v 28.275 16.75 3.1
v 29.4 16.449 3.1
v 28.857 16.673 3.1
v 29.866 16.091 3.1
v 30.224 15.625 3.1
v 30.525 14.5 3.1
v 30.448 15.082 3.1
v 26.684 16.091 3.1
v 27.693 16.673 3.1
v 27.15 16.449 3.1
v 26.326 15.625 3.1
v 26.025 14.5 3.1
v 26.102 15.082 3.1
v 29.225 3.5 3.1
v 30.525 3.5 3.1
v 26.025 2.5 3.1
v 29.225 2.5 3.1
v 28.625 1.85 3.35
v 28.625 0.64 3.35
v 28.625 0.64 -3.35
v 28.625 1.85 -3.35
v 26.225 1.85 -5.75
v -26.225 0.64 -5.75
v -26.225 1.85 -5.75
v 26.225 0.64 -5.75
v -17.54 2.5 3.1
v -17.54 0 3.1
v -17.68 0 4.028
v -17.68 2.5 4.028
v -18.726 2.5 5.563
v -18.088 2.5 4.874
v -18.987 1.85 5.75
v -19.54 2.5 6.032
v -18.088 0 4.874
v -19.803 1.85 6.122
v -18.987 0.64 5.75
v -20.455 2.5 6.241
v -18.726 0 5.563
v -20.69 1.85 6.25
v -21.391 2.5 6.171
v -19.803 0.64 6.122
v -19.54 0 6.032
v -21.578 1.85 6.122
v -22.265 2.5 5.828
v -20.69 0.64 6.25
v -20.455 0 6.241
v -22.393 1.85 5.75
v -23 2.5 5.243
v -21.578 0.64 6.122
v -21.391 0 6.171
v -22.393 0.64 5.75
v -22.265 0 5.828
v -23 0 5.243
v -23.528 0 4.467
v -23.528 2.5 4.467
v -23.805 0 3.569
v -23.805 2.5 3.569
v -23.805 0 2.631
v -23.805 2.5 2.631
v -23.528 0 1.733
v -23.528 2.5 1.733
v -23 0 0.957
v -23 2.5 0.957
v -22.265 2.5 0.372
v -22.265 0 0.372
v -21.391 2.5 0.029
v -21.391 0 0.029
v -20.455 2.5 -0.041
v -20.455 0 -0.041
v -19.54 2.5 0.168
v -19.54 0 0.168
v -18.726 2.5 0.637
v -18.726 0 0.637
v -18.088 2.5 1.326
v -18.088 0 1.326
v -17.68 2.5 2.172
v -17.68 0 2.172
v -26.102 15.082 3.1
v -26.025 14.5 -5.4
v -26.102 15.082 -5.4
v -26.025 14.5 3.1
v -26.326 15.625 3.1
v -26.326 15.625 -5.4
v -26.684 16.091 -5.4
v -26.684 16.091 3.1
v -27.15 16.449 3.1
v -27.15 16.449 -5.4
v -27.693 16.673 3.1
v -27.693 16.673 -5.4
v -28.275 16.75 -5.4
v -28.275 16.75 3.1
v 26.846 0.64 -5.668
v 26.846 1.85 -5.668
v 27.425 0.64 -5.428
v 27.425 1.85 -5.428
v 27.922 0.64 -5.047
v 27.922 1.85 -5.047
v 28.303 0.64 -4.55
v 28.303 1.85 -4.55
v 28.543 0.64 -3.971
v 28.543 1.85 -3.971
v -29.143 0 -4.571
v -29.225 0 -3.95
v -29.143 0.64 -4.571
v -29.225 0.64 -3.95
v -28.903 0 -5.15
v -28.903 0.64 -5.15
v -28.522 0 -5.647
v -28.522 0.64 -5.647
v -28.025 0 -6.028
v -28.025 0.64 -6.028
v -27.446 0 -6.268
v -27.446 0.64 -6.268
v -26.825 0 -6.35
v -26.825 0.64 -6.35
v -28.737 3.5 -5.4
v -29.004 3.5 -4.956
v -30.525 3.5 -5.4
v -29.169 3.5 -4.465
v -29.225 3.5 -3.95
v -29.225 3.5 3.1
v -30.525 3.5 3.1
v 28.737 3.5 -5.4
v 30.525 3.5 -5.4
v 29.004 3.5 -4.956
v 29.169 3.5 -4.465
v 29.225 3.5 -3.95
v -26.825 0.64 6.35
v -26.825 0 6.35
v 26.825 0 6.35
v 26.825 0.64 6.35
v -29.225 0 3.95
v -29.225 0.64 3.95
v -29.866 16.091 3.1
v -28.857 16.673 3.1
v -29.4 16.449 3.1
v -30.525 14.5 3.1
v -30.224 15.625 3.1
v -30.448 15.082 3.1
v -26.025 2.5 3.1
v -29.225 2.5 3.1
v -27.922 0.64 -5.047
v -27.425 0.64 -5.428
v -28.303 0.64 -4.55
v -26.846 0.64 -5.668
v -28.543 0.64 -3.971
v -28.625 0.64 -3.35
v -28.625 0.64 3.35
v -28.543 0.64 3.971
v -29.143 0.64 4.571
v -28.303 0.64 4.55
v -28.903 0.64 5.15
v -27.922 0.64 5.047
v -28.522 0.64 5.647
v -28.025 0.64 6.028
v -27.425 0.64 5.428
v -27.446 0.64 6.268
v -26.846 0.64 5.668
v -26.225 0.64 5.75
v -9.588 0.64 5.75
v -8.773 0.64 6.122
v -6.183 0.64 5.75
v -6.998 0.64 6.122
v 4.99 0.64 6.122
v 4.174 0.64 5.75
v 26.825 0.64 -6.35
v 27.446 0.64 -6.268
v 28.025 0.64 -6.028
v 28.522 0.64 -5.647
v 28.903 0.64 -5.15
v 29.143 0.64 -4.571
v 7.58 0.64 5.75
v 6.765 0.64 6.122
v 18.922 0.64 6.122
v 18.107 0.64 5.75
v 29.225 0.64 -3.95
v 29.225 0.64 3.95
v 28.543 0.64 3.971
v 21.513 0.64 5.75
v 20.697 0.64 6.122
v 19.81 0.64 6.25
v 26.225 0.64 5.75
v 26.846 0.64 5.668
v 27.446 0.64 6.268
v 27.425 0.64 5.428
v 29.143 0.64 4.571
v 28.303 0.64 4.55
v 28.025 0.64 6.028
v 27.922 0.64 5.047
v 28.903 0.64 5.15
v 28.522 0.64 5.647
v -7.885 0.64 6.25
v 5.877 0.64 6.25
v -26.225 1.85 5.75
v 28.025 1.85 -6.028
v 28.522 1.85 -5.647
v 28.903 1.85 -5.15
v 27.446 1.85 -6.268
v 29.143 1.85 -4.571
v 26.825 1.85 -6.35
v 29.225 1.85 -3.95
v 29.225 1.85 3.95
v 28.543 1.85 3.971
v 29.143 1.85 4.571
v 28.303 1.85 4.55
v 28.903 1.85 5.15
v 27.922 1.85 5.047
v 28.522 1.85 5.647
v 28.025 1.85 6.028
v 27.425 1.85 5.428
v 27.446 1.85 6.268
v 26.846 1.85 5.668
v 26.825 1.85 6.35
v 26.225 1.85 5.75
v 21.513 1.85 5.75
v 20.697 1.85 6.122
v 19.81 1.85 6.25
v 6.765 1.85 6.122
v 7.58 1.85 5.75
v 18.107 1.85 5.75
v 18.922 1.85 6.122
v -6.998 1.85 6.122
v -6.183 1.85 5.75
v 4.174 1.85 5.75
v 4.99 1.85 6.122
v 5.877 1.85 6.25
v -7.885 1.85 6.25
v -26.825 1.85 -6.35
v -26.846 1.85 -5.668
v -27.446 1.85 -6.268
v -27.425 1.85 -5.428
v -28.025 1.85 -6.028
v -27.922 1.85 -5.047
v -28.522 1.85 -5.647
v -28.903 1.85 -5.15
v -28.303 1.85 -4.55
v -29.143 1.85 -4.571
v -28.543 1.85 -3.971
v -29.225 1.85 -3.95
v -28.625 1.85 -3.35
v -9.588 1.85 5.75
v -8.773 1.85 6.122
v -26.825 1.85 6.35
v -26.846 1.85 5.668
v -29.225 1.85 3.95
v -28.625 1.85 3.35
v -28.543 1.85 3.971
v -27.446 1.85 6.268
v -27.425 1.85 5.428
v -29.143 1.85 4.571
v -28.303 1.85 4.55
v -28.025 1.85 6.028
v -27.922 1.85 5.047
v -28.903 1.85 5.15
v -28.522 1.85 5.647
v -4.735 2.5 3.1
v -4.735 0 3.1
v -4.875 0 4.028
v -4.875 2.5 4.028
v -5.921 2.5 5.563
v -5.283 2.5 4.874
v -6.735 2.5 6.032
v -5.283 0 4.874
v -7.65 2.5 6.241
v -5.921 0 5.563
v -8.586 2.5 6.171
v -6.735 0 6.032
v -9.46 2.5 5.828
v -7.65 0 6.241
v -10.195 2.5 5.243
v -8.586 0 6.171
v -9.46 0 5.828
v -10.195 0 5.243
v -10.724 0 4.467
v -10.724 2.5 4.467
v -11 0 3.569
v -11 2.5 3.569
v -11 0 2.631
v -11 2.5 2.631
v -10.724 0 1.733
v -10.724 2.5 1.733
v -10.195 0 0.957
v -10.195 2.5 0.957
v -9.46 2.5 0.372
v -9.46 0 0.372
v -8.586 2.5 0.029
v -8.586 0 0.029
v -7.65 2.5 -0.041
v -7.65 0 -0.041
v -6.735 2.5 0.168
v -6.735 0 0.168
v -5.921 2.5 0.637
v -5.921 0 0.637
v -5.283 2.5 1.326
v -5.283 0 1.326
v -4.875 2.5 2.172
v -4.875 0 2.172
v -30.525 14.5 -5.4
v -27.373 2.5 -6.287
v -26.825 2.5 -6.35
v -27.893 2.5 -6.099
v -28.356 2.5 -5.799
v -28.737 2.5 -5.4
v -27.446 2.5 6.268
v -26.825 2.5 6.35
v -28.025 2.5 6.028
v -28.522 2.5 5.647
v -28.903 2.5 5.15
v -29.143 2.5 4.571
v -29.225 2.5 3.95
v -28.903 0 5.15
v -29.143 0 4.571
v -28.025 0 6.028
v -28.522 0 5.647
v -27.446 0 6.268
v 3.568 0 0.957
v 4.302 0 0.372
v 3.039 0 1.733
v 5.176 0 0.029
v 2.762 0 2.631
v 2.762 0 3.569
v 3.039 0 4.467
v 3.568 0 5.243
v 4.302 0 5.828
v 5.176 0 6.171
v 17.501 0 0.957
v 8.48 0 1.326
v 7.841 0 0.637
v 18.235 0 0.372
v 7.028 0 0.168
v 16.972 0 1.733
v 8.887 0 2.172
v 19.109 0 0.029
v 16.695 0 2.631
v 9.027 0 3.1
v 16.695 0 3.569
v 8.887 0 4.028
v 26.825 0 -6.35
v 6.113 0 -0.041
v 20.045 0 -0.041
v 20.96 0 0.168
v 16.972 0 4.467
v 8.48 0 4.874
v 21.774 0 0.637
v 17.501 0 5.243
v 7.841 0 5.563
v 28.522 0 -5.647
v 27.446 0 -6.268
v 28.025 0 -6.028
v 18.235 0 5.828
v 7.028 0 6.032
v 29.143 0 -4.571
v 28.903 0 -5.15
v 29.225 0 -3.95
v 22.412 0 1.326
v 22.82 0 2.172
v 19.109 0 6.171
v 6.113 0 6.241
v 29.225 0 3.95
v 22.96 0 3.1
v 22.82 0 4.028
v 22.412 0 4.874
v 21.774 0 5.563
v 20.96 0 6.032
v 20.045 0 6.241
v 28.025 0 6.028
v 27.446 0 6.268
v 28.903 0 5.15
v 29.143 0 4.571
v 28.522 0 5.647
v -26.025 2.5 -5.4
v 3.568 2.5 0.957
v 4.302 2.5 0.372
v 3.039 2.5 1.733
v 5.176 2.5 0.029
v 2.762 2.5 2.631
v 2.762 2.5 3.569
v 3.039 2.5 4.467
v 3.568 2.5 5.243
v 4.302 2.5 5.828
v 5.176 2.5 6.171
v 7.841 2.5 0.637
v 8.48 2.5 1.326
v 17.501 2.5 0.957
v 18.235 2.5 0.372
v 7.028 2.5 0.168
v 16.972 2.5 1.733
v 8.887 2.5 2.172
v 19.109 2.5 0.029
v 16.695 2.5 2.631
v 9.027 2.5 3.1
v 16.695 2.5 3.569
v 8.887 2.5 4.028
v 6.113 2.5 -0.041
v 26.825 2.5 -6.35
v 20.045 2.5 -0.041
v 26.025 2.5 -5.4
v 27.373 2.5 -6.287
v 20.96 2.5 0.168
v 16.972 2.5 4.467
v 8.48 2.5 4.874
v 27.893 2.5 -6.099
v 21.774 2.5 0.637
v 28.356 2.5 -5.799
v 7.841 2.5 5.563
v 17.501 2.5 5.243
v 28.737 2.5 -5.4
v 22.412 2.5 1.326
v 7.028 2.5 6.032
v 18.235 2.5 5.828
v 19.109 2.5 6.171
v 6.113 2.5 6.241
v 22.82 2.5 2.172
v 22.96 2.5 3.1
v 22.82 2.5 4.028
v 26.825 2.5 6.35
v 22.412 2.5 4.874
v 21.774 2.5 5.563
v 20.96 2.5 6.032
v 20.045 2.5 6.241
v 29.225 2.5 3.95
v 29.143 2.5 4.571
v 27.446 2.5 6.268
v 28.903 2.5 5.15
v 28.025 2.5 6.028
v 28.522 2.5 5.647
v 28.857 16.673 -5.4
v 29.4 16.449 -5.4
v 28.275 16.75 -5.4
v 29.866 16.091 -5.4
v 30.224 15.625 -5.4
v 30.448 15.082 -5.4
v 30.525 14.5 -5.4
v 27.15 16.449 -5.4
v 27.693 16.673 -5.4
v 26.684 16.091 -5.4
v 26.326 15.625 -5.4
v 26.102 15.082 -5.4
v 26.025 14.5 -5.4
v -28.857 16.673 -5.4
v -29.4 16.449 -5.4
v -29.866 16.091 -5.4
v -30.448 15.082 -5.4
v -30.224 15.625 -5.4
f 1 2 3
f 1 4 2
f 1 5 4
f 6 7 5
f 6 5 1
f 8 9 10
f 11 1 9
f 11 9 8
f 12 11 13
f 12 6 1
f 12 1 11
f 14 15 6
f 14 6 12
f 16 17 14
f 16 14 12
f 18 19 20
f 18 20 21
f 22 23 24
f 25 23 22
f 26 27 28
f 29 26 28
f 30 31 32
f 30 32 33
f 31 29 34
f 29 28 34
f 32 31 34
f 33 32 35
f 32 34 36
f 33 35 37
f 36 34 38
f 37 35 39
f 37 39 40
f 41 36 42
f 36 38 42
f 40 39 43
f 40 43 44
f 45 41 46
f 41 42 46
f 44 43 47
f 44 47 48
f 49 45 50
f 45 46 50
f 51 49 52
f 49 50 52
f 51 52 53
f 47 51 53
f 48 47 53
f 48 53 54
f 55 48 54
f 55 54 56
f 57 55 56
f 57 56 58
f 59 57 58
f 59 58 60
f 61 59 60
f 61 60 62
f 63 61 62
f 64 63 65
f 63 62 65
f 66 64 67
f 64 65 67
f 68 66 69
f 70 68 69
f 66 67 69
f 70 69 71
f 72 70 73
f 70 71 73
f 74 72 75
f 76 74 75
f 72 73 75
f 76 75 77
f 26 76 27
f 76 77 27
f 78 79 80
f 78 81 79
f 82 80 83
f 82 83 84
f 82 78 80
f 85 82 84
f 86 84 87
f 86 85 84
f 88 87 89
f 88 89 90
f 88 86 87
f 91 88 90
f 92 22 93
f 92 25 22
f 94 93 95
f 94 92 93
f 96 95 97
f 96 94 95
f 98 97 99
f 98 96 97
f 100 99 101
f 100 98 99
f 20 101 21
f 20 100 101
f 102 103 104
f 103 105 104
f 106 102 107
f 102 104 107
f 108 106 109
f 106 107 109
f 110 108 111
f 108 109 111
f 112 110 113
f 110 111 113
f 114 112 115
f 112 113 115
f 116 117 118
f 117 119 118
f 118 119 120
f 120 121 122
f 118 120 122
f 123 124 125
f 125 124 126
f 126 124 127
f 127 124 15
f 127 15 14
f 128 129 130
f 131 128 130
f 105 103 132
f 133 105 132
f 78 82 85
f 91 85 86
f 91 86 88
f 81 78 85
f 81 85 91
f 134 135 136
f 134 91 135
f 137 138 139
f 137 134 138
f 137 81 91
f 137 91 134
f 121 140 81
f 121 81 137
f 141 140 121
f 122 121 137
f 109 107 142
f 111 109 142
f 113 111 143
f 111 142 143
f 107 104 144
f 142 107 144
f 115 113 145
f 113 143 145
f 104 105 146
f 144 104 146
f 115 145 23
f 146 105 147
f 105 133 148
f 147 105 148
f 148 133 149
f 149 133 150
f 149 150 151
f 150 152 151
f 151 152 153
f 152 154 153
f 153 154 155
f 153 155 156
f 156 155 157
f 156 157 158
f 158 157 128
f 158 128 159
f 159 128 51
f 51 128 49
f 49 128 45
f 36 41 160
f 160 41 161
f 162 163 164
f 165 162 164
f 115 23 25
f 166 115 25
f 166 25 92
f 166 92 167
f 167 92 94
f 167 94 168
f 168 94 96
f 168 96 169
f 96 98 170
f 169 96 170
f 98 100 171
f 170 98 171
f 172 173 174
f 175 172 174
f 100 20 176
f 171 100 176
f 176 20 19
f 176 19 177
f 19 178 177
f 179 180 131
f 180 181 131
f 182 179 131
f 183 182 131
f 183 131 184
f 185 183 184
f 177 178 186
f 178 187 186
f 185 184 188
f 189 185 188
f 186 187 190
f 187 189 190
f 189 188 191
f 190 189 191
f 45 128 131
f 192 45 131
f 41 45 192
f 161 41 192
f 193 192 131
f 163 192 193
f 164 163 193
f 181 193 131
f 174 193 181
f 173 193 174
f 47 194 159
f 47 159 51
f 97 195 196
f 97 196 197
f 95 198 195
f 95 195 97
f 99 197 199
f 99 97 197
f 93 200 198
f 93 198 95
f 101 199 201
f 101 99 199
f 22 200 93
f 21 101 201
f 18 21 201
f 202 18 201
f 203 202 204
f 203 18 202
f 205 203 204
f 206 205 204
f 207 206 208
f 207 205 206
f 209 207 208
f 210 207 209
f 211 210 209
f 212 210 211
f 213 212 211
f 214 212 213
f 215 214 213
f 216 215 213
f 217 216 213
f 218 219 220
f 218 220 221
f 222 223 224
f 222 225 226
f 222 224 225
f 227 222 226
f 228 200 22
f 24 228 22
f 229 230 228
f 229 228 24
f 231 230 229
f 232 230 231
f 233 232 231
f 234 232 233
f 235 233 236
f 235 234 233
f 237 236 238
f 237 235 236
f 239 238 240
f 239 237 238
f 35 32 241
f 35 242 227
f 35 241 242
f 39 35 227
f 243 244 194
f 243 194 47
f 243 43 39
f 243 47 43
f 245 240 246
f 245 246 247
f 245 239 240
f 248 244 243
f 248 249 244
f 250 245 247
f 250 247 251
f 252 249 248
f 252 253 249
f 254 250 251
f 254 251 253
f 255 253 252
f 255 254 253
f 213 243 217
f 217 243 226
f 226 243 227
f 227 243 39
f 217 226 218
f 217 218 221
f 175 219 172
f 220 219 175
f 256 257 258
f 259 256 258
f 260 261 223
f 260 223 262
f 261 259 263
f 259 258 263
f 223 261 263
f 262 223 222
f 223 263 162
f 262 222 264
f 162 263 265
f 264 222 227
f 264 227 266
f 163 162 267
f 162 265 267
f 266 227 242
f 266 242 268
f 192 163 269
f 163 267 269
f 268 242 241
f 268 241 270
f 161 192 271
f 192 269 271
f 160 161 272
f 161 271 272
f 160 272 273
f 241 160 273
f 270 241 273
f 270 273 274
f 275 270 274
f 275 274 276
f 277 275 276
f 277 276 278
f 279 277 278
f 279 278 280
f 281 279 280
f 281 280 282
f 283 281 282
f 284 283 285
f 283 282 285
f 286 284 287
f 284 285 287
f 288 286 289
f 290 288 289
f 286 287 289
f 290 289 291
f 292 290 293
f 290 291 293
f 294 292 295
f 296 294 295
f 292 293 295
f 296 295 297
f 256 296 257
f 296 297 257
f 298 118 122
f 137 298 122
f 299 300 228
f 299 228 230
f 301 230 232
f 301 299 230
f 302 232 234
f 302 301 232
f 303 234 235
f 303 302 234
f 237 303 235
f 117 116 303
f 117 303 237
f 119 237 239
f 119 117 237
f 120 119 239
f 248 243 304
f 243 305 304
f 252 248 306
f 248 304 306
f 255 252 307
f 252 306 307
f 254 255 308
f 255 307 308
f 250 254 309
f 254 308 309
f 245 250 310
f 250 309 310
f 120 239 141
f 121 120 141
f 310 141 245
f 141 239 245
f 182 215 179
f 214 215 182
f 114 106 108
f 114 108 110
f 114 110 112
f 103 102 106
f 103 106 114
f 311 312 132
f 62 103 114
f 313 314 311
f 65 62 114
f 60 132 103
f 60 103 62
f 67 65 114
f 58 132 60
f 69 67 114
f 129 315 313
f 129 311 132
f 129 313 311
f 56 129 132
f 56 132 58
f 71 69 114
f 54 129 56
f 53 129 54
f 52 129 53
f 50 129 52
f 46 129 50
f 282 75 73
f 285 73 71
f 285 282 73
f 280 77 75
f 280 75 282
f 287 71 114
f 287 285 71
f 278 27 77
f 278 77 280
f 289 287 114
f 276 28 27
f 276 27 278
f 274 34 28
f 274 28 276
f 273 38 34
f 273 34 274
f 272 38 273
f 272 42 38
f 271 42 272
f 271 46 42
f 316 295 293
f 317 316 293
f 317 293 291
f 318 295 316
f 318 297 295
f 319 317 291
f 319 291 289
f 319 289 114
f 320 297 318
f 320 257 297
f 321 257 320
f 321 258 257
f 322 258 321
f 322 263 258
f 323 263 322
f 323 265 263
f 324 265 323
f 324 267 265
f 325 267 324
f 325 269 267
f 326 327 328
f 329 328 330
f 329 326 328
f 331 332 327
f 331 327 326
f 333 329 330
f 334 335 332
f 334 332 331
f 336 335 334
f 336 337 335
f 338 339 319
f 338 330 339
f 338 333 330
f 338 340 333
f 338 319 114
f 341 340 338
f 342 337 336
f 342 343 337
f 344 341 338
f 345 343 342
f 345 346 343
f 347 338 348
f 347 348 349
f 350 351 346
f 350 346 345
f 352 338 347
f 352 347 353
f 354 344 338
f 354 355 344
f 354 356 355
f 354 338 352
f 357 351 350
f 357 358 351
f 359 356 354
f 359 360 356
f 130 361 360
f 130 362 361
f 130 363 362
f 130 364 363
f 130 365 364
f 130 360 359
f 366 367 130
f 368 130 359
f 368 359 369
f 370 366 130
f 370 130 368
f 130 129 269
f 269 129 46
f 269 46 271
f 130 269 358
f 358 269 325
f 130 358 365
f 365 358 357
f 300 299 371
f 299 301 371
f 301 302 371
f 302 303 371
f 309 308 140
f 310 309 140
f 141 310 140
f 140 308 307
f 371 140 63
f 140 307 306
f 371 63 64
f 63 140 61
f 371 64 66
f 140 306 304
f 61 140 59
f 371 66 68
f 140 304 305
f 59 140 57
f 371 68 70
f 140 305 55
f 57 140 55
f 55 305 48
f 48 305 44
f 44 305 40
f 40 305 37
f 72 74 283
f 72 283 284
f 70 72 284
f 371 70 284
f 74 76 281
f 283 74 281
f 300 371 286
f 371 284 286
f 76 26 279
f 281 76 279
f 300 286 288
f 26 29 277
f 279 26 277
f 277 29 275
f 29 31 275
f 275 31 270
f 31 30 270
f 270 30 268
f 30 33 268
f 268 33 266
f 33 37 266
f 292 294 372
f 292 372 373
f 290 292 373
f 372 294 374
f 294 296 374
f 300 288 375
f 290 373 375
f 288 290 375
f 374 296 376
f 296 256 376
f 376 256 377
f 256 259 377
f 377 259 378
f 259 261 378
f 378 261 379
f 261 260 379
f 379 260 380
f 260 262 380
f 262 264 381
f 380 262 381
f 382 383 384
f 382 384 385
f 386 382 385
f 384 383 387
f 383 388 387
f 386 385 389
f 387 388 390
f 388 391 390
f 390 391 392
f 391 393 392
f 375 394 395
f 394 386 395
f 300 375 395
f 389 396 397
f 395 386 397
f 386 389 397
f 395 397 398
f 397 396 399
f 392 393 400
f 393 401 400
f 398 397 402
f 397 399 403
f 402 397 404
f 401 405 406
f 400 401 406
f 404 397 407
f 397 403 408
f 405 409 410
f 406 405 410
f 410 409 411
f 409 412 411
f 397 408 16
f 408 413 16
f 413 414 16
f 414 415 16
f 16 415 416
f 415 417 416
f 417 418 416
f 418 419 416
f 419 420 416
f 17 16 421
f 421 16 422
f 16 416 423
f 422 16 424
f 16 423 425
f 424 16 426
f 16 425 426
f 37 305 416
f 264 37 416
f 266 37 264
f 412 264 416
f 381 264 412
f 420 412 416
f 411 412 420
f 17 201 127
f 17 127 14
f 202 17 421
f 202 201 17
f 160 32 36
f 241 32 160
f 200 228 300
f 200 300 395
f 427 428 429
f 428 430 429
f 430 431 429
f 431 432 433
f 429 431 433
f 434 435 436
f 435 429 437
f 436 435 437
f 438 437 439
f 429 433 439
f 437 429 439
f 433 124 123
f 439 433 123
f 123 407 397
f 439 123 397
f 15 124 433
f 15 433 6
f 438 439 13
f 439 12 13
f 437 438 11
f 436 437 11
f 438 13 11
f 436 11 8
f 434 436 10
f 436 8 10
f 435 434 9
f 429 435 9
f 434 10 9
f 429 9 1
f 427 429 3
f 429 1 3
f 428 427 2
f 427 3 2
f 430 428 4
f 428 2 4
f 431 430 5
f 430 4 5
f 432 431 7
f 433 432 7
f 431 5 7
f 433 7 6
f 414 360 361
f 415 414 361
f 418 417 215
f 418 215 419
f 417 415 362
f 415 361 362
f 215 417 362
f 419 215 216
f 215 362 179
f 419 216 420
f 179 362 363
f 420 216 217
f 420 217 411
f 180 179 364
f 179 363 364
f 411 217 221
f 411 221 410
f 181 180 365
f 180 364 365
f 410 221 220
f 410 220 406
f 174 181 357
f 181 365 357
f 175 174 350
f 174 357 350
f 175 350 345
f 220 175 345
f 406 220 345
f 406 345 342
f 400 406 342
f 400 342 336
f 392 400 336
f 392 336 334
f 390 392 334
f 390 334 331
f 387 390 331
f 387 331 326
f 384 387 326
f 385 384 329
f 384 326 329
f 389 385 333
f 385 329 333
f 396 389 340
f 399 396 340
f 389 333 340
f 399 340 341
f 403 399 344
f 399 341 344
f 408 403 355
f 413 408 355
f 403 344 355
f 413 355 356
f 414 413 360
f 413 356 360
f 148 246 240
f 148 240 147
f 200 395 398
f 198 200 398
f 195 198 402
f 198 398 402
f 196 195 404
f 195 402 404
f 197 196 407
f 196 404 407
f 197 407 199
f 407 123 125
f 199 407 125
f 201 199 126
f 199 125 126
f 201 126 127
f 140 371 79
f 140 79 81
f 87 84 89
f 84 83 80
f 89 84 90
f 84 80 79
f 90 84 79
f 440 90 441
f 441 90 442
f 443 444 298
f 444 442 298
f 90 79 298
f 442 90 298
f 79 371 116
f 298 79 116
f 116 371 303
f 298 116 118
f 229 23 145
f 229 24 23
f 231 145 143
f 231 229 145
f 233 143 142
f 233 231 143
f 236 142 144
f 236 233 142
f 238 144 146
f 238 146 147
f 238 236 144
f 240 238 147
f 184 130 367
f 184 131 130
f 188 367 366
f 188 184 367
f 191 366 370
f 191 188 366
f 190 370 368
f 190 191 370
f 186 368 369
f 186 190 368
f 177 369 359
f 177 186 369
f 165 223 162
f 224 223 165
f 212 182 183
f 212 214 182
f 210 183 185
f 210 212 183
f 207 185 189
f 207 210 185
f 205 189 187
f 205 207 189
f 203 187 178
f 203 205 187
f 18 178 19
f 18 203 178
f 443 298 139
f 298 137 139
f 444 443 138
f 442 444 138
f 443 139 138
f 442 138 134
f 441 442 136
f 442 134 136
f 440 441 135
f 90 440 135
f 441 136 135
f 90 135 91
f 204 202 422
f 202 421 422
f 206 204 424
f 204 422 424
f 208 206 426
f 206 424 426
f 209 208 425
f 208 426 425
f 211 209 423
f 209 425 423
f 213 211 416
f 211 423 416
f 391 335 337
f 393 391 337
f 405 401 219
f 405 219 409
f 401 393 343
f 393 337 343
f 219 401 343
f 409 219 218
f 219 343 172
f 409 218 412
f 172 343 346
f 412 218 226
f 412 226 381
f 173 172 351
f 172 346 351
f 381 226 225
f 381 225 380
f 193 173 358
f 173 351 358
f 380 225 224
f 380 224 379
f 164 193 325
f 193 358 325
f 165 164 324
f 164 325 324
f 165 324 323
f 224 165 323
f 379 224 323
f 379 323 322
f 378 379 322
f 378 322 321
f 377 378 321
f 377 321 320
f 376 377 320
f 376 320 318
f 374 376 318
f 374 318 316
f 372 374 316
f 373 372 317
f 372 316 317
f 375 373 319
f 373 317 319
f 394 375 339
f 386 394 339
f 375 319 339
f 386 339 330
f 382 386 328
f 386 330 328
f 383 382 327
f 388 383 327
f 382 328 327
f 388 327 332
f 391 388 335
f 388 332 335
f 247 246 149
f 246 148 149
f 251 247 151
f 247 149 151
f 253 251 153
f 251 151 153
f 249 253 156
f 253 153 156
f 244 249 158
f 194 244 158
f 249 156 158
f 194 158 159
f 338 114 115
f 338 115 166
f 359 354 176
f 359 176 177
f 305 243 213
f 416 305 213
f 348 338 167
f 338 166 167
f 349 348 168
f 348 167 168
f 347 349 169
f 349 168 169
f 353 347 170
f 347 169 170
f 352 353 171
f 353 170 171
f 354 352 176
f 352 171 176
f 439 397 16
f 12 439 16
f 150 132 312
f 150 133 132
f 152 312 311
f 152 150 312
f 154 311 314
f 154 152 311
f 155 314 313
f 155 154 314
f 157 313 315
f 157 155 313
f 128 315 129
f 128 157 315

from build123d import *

# Parameters (mm, degrees)
F0_W      = 58.45
F0_H      = 12.7
F1_DEPTH  = 2.5
F2_W      = 58.45
F2_H      = 1.21
F6_DEPTH  = 0.6
F4_W      = 58.45
F4_H      = 1.21
F7_DEPTH  = 0.6
F5_W      = 1.21
F5_H      = 12.7
F8_DEPTH  = 0.6
F3_W      = 1.21
F3_H      = 12.7
F9_DEPTH  = 0.6
F10_W     = 3.2
F10_H     = 8.5
F11_DEPTH = 1
F12_R     = 2.4
F14_W     = 4.5
F14_H     = 8.5
F13_W     = 4.5
F13_H     = 8.5
F15_DEPTH = 13.25
F16_R     = 2.24999
F17_R     = 3.15
F18_DEPTH = 16.751


# Not quite as in the source:
# - a fillet or chamfer is up to 0.001 mm smaller than in the source, because OpenCascade refuses the exact size


with BuildPart() as f1:
    # F0 (on Front) → F1 (new body)
    with BuildSketch(Plane.XZ):
        Rectangle(F0_W, F0_H)
    extrude(amount=-F1_DEPTH)

    # F2 (on face) → F6 (cut)
    with BuildSketch(Plane.XY.offset(6.35)):
        with Locations((0, 1.245)):
            Rectangle(F2_W, F2_H)
    extrude(amount=-F6_DEPTH, mode=Mode.SUBTRACT)

    # F4 (on face) → F7 (cut)
    with BuildSketch(Plane(origin=(0, 0, -6.35), x_dir=(1, 0, 0), z_dir=(0, 0, -1))):
        with Locations((0, -1.245)):
            Rectangle(F4_W, F4_H)
    extrude(amount=-F7_DEPTH, mode=Mode.SUBTRACT)

    # F5 (on face) → F8 (cut)
    with BuildSketch(Plane.YZ.offset(29.225)):
        with Locations((1.245, 0)):
            Rectangle(F5_W, F5_H)
    extrude(amount=-F8_DEPTH, mode=Mode.SUBTRACT)

    # F3 (on face) → F9 (cut)
    with BuildSketch(Plane(origin=(-29.225, 0, 0), x_dir=(0, -1, 0), z_dir=(-1, 0, 0))):
        with Locations((-1.245, 0)):
            Rectangle(F3_W, F3_H)
    extrude(amount=-F9_DEPTH, mode=Mode.SUBTRACT)

    # F10 (on face) → F11 (join)
    with BuildSketch(Plane(origin=(0, 2.5, 0), x_dir=(-1, 0, 0), z_dir=(0, 1, 0))):
        with Locations((-27.625, -1.15)):
            Rectangle(F10_W, F10_H)
        with Locations((27.625, -1.15)):
            Rectangle(F10_W, F10_H)
    extrude(amount=F11_DEPTH)

    # F12
    f12_edges = [f1.edges().sort_by_distance(p)[0] for p in [
        (-29.225, 2.175, -6.35),
        (-28.625, 1.245, -5.75),
        (-29.225, 0.32, -6.35),
        (-29.225, 0.32, 6.35),
        (-28.625, 1.245, 5.75),
        (-29.225, 2.175, 6.35),
        (29.225, 0.32, 6.35),
        (28.625, 1.245, 5.75),
        (29.225, 2.175, 6.35),
        (29.225, 0.32, -6.35),
        (28.625, 1.245, -5.75),
        (29.225, 2.175, -6.35),
    ]]
    fillet(f12_edges, radius=F12_R)

    # F14 (on face) + F13 (on face) → F15 (join)
    with BuildSketch(Plane(origin=(0, 3.5, 0), x_dir=(-1, 0, 0), z_dir=(0, 1, 0))):
        with Locations((28.275, -1.15)):
            Rectangle(F14_W, F14_H)
    with BuildSketch(Plane(origin=(0, 3.5, 0), x_dir=(-1, 0, 0), z_dir=(0, 1, 0))):
        with Locations((-28.275, -1.15)):
            Rectangle(F13_W, F13_H)
    extrude(amount=F15_DEPTH)

    # F16 (radius 2.25 in the source; OpenCascade refuses exactly that, so slightly less here)
    f16_edges = [f1.edges().sort_by_distance(p)[0] for p in [
        (26.025, 16.75, -1.15),
        (30.525, 16.75, -1.15),
        (-26.025, 16.75, -1.15),
        (-30.525, 16.75, -1.15),
    ]]
    fillet(f16_edges, radius=F16_R)

    # F17 (on face) → F18 (cut, through all)
    with BuildSketch(Plane.XZ):
        with Locations((19.8096737738, 3.1)):
            Circle(F17_R)
        with Locations((5.8772991731, 3.1)):
            Circle(F17_R)
        with Locations((-7.8854865344, 3.1)):
            Circle(F17_R)
        with Locations((-20.6904198083, 3.1)):
            Circle(F17_R)
    extrude(amount=-F18_DEPTH, mode=Mode.SUBTRACT)


solid = f1.part
